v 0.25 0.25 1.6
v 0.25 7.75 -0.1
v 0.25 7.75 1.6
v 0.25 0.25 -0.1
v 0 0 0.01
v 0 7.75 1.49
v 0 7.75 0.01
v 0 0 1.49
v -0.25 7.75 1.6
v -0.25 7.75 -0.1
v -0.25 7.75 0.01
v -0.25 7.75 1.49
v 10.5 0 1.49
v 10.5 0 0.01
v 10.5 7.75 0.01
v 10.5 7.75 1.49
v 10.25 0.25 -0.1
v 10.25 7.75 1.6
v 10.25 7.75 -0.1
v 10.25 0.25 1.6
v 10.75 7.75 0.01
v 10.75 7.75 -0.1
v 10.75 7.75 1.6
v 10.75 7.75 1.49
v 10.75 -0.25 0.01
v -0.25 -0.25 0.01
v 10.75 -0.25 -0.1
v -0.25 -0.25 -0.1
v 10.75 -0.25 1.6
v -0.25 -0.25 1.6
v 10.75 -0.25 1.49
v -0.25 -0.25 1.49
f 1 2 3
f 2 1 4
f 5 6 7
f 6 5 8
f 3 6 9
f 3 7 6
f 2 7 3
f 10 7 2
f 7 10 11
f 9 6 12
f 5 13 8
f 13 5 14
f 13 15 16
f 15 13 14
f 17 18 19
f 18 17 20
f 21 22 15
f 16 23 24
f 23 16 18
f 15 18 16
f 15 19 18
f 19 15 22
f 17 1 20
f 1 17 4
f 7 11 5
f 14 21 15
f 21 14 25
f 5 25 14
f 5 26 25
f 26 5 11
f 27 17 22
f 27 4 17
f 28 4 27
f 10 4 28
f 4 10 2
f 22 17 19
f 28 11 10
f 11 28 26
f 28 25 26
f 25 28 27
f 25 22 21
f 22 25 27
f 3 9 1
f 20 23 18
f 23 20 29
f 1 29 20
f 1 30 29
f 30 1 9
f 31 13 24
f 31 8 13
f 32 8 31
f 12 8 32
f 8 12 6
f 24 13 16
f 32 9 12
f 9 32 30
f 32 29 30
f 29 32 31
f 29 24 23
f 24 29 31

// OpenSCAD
// Cat door U-shaped liner
// Fits into a rectangular box cut into a door, lining the bottom and
// two sides with a thin wall so a smaller insert seats snugly in the gap.
// Top of the U is left open.
//
// Flanges at the front and/or back cap the ends, sitting flush against
// the door's face and overlapping the cut edge to hide it.

// ---- Parameters (inches) ----
door_depth      = 1.5;   // door thickness (liner spans this, Z)
box_width       = 10.5;  // width of the cutout in the door (X)
box_height      = 7.75;  // height of the cutout in the door (Y)
wall            = 0.25;  // thickness of the liner material (the gap it fills)

flange_front    = true;  // add a flange on the front face
flange_back     = true;  // add a flange on the back face
flange_overlap  = 0.25;  // how far the flange extends past the cut edge
flange_thick    = 0.1;   // flange thickness (Z), kept small/low-profile

eps = 0.01; // small overlap so flange and liner fuse into one solid

// ---- Model ----
// U shape: two side rectangles + one bottom rectangle, open at the top.
// w/h are the outer footprint, wall_thick the leg width, spanning z0..z1,
// shifted by (x_off, y_off) so a flange can grow outward from the liner.
module u_shape(w, h, wall_thick, z0, z1, x_off = 0, y_off = 0) {
    zt = z1 - z0;
    translate([x_off, y_off, z0]) {
        cube([wall_thick, h, zt]);                       // left side
        translate([w - wall_thick, 0, 0])
            cube([wall_thick, h, zt]);                    // right side
        cube([w, wall_thick, zt]);                        // bottom
    }
}

module cat_door_liner() {
    // Main liner, filling the through-hole depth
    u_shape(box_width, box_height, wall, 0, door_depth);

    // Front flange: sits in front of the door face (z < 0), wider than
    // the hole so it overlaps and hides the cut on 3 sides (not the top)
    if (flange_front)
        u_shape(box_width + 2 * flange_overlap, box_height + flange_overlap,
                wall + flange_overlap, -flange_thick, eps,
                -flange_overlap, -flange_overlap);

    // Back flange: mirrors the front, behind the door face (z > door_depth)
    if (flange_back)
        u_shape(box_width + 2 * flange_overlap, box_height + flange_overlap,
                wall + flange_overlap, door_depth - eps, door_depth + flange_thick,
                -flange_overlap, -flange_overlap);
}

cat_door_liner();
